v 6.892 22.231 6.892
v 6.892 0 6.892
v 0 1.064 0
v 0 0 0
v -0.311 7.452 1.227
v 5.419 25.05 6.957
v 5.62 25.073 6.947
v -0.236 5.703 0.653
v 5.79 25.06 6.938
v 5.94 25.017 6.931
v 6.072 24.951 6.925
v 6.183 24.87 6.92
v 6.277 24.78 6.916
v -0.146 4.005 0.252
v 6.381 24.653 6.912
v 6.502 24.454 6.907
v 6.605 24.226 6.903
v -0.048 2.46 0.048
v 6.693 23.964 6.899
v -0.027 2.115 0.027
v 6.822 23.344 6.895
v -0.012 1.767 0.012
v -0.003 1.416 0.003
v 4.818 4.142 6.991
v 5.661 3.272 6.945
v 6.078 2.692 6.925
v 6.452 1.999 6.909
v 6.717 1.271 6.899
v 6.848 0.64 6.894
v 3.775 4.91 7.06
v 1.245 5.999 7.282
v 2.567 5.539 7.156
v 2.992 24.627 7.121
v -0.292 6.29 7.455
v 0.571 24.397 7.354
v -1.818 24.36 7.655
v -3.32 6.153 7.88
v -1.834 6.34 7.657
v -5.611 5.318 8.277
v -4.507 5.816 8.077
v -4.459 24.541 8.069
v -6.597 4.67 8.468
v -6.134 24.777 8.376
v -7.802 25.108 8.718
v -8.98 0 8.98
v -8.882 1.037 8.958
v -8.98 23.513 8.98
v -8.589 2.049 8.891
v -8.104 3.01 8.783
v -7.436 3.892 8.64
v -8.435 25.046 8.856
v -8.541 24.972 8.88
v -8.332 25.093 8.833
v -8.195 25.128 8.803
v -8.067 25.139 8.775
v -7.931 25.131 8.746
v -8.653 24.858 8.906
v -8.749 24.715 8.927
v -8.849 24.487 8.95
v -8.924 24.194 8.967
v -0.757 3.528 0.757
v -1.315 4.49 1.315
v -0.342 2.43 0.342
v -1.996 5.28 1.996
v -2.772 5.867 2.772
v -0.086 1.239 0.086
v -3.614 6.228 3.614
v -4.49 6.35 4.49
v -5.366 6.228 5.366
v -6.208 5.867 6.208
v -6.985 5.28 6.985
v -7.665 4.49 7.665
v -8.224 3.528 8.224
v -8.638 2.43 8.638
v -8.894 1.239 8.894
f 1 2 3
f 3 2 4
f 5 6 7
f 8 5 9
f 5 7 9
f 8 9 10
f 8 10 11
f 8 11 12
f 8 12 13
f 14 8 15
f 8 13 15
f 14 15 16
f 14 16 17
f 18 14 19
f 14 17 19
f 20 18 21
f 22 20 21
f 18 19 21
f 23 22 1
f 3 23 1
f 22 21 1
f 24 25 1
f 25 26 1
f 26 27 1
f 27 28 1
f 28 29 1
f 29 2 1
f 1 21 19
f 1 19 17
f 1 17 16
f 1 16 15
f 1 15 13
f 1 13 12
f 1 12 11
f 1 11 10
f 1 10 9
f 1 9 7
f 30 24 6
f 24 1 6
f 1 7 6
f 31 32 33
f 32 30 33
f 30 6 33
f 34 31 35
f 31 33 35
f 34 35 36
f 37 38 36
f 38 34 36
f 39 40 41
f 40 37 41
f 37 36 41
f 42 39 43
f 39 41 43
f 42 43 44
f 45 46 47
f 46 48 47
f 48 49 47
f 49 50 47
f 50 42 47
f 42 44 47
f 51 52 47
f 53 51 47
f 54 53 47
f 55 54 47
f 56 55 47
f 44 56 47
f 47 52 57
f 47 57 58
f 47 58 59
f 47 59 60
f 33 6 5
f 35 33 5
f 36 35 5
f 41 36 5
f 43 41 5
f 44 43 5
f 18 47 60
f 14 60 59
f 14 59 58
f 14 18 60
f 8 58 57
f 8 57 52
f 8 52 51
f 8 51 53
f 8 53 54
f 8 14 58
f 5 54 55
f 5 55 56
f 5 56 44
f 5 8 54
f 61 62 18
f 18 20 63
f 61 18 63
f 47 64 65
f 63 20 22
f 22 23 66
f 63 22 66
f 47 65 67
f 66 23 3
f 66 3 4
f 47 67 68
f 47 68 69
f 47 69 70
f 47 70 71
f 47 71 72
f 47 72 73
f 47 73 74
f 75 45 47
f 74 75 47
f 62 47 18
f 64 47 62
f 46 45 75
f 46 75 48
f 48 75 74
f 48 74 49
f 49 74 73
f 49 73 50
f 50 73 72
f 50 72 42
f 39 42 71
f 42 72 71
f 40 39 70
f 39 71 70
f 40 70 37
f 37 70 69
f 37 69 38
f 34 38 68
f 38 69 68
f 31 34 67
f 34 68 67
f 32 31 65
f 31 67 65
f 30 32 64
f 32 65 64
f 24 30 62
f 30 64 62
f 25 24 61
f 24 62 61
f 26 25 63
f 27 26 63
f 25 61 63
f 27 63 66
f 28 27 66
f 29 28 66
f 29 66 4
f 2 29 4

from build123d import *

# Parameters (mm, degrees)
BOSS_EXTRUDE1_DEPTH = 25.4
CUT_EXTRUDE1_REACH  = 30.398
SKETCH2_R           = 6.35
SKETCH4_R           = 83.82
CUT_EXTRUDE3_DEPTH  = 29.398063314
CUT_EXTRUDE4_REACH  = 30.361
FILLET1_R           = 2.54


with BuildPart() as part:
    # Sketch1 → Boss-Extrude1 (new body)
    with BuildSketch(Plane(origin=(0, 0, 0), x_dir=(1, 0, 0), z_dir=(0, 1, 0))):
        Polygon((0, 0), (-8.980256121, -8.980256121), (8.980256121, -8.980256121), align=None)
    extrude(amount=BOSS_EXTRUDE1_DEPTH)

    # Sketch2 → Cut-Extrude1 (cut, up to next)
    with BuildSketch(Plane(origin=(0, 0, 0), x_dir=(-0.7071067811865474, 0, 0.7071067811865477), z_dir=(-0.7071067811865477, 0, -0.7071067811865474)), mode=Mode.PRIVATE) as cut_extrude1_sk1:
        with Locations((6.35, 0)):
            Circle(SKETCH2_R)
    cut_extrude1_tool1 = extrude(cut_extrude1_sk1.sketch, amount=-CUT_EXTRUDE1_REACH, mode=Mode.PRIVATE) & part.part
    add(cut_extrude1_tool1.solids().sort_by_distance((-4.490128, 0, 4.490128))[0], mode=Mode.SUBTRACT)

    # Sketch4 → Cut-Extrude3 (cut, through all)
    with BuildSketch(Plane(origin=(0, 25.4, 0), x_dir=(1, 0, 0), z_dir=(0, 1, 0))):
        with Locations((9.838175311, -90.660480401)):
            Circle(SKETCH4_R)
    extrude(amount=-CUT_EXTRUDE3_DEPTH, mode=Mode.SUBTRACT)

    # Sketch5 → Cut-Extrude4 (cut, up to next)
    with BuildSketch(Plane(origin=(-0.17794868, 0.498418532, -1.352732428), x_dir=(0.9924678045108148, 0.042354141044031964, -0.11495122333366167), z_dir=(0.12250574276124004, -0.3431277622293754, 0.9312656343804265)), mode=Mode.PRIVATE) as cut_extrude4_sk1:
        Polygon((7.123871491, 3.972277825), (-8.869111321, 3.972277825), (-8.869111321, 26.938427805), (7.123871491, 26.216542503), align=None)
    cut_extrude4_tool1 = extrude(cut_extrude4_sk1.sketch, amount=-CUT_EXTRUDE4_REACH, mode=Mode.PRIVATE) & part.part
    add(cut_extrude4_tool1.solids().sort_by_distance((-1.086236, 14.793489, 4.033814))[0], mode=Mode.SUBTRACT)

    # Fillet1
    fillet1_edges = [part.edges().sort_by_distance(p)[0] for p in [
        (3.446132209, 14.816666667, 3.446132209),
        (-4.490128061, 14.816666667, 4.490128061),
    ]]
    fillet(fillet1_edges, radius=FILLET1_R)


solid = part.part
